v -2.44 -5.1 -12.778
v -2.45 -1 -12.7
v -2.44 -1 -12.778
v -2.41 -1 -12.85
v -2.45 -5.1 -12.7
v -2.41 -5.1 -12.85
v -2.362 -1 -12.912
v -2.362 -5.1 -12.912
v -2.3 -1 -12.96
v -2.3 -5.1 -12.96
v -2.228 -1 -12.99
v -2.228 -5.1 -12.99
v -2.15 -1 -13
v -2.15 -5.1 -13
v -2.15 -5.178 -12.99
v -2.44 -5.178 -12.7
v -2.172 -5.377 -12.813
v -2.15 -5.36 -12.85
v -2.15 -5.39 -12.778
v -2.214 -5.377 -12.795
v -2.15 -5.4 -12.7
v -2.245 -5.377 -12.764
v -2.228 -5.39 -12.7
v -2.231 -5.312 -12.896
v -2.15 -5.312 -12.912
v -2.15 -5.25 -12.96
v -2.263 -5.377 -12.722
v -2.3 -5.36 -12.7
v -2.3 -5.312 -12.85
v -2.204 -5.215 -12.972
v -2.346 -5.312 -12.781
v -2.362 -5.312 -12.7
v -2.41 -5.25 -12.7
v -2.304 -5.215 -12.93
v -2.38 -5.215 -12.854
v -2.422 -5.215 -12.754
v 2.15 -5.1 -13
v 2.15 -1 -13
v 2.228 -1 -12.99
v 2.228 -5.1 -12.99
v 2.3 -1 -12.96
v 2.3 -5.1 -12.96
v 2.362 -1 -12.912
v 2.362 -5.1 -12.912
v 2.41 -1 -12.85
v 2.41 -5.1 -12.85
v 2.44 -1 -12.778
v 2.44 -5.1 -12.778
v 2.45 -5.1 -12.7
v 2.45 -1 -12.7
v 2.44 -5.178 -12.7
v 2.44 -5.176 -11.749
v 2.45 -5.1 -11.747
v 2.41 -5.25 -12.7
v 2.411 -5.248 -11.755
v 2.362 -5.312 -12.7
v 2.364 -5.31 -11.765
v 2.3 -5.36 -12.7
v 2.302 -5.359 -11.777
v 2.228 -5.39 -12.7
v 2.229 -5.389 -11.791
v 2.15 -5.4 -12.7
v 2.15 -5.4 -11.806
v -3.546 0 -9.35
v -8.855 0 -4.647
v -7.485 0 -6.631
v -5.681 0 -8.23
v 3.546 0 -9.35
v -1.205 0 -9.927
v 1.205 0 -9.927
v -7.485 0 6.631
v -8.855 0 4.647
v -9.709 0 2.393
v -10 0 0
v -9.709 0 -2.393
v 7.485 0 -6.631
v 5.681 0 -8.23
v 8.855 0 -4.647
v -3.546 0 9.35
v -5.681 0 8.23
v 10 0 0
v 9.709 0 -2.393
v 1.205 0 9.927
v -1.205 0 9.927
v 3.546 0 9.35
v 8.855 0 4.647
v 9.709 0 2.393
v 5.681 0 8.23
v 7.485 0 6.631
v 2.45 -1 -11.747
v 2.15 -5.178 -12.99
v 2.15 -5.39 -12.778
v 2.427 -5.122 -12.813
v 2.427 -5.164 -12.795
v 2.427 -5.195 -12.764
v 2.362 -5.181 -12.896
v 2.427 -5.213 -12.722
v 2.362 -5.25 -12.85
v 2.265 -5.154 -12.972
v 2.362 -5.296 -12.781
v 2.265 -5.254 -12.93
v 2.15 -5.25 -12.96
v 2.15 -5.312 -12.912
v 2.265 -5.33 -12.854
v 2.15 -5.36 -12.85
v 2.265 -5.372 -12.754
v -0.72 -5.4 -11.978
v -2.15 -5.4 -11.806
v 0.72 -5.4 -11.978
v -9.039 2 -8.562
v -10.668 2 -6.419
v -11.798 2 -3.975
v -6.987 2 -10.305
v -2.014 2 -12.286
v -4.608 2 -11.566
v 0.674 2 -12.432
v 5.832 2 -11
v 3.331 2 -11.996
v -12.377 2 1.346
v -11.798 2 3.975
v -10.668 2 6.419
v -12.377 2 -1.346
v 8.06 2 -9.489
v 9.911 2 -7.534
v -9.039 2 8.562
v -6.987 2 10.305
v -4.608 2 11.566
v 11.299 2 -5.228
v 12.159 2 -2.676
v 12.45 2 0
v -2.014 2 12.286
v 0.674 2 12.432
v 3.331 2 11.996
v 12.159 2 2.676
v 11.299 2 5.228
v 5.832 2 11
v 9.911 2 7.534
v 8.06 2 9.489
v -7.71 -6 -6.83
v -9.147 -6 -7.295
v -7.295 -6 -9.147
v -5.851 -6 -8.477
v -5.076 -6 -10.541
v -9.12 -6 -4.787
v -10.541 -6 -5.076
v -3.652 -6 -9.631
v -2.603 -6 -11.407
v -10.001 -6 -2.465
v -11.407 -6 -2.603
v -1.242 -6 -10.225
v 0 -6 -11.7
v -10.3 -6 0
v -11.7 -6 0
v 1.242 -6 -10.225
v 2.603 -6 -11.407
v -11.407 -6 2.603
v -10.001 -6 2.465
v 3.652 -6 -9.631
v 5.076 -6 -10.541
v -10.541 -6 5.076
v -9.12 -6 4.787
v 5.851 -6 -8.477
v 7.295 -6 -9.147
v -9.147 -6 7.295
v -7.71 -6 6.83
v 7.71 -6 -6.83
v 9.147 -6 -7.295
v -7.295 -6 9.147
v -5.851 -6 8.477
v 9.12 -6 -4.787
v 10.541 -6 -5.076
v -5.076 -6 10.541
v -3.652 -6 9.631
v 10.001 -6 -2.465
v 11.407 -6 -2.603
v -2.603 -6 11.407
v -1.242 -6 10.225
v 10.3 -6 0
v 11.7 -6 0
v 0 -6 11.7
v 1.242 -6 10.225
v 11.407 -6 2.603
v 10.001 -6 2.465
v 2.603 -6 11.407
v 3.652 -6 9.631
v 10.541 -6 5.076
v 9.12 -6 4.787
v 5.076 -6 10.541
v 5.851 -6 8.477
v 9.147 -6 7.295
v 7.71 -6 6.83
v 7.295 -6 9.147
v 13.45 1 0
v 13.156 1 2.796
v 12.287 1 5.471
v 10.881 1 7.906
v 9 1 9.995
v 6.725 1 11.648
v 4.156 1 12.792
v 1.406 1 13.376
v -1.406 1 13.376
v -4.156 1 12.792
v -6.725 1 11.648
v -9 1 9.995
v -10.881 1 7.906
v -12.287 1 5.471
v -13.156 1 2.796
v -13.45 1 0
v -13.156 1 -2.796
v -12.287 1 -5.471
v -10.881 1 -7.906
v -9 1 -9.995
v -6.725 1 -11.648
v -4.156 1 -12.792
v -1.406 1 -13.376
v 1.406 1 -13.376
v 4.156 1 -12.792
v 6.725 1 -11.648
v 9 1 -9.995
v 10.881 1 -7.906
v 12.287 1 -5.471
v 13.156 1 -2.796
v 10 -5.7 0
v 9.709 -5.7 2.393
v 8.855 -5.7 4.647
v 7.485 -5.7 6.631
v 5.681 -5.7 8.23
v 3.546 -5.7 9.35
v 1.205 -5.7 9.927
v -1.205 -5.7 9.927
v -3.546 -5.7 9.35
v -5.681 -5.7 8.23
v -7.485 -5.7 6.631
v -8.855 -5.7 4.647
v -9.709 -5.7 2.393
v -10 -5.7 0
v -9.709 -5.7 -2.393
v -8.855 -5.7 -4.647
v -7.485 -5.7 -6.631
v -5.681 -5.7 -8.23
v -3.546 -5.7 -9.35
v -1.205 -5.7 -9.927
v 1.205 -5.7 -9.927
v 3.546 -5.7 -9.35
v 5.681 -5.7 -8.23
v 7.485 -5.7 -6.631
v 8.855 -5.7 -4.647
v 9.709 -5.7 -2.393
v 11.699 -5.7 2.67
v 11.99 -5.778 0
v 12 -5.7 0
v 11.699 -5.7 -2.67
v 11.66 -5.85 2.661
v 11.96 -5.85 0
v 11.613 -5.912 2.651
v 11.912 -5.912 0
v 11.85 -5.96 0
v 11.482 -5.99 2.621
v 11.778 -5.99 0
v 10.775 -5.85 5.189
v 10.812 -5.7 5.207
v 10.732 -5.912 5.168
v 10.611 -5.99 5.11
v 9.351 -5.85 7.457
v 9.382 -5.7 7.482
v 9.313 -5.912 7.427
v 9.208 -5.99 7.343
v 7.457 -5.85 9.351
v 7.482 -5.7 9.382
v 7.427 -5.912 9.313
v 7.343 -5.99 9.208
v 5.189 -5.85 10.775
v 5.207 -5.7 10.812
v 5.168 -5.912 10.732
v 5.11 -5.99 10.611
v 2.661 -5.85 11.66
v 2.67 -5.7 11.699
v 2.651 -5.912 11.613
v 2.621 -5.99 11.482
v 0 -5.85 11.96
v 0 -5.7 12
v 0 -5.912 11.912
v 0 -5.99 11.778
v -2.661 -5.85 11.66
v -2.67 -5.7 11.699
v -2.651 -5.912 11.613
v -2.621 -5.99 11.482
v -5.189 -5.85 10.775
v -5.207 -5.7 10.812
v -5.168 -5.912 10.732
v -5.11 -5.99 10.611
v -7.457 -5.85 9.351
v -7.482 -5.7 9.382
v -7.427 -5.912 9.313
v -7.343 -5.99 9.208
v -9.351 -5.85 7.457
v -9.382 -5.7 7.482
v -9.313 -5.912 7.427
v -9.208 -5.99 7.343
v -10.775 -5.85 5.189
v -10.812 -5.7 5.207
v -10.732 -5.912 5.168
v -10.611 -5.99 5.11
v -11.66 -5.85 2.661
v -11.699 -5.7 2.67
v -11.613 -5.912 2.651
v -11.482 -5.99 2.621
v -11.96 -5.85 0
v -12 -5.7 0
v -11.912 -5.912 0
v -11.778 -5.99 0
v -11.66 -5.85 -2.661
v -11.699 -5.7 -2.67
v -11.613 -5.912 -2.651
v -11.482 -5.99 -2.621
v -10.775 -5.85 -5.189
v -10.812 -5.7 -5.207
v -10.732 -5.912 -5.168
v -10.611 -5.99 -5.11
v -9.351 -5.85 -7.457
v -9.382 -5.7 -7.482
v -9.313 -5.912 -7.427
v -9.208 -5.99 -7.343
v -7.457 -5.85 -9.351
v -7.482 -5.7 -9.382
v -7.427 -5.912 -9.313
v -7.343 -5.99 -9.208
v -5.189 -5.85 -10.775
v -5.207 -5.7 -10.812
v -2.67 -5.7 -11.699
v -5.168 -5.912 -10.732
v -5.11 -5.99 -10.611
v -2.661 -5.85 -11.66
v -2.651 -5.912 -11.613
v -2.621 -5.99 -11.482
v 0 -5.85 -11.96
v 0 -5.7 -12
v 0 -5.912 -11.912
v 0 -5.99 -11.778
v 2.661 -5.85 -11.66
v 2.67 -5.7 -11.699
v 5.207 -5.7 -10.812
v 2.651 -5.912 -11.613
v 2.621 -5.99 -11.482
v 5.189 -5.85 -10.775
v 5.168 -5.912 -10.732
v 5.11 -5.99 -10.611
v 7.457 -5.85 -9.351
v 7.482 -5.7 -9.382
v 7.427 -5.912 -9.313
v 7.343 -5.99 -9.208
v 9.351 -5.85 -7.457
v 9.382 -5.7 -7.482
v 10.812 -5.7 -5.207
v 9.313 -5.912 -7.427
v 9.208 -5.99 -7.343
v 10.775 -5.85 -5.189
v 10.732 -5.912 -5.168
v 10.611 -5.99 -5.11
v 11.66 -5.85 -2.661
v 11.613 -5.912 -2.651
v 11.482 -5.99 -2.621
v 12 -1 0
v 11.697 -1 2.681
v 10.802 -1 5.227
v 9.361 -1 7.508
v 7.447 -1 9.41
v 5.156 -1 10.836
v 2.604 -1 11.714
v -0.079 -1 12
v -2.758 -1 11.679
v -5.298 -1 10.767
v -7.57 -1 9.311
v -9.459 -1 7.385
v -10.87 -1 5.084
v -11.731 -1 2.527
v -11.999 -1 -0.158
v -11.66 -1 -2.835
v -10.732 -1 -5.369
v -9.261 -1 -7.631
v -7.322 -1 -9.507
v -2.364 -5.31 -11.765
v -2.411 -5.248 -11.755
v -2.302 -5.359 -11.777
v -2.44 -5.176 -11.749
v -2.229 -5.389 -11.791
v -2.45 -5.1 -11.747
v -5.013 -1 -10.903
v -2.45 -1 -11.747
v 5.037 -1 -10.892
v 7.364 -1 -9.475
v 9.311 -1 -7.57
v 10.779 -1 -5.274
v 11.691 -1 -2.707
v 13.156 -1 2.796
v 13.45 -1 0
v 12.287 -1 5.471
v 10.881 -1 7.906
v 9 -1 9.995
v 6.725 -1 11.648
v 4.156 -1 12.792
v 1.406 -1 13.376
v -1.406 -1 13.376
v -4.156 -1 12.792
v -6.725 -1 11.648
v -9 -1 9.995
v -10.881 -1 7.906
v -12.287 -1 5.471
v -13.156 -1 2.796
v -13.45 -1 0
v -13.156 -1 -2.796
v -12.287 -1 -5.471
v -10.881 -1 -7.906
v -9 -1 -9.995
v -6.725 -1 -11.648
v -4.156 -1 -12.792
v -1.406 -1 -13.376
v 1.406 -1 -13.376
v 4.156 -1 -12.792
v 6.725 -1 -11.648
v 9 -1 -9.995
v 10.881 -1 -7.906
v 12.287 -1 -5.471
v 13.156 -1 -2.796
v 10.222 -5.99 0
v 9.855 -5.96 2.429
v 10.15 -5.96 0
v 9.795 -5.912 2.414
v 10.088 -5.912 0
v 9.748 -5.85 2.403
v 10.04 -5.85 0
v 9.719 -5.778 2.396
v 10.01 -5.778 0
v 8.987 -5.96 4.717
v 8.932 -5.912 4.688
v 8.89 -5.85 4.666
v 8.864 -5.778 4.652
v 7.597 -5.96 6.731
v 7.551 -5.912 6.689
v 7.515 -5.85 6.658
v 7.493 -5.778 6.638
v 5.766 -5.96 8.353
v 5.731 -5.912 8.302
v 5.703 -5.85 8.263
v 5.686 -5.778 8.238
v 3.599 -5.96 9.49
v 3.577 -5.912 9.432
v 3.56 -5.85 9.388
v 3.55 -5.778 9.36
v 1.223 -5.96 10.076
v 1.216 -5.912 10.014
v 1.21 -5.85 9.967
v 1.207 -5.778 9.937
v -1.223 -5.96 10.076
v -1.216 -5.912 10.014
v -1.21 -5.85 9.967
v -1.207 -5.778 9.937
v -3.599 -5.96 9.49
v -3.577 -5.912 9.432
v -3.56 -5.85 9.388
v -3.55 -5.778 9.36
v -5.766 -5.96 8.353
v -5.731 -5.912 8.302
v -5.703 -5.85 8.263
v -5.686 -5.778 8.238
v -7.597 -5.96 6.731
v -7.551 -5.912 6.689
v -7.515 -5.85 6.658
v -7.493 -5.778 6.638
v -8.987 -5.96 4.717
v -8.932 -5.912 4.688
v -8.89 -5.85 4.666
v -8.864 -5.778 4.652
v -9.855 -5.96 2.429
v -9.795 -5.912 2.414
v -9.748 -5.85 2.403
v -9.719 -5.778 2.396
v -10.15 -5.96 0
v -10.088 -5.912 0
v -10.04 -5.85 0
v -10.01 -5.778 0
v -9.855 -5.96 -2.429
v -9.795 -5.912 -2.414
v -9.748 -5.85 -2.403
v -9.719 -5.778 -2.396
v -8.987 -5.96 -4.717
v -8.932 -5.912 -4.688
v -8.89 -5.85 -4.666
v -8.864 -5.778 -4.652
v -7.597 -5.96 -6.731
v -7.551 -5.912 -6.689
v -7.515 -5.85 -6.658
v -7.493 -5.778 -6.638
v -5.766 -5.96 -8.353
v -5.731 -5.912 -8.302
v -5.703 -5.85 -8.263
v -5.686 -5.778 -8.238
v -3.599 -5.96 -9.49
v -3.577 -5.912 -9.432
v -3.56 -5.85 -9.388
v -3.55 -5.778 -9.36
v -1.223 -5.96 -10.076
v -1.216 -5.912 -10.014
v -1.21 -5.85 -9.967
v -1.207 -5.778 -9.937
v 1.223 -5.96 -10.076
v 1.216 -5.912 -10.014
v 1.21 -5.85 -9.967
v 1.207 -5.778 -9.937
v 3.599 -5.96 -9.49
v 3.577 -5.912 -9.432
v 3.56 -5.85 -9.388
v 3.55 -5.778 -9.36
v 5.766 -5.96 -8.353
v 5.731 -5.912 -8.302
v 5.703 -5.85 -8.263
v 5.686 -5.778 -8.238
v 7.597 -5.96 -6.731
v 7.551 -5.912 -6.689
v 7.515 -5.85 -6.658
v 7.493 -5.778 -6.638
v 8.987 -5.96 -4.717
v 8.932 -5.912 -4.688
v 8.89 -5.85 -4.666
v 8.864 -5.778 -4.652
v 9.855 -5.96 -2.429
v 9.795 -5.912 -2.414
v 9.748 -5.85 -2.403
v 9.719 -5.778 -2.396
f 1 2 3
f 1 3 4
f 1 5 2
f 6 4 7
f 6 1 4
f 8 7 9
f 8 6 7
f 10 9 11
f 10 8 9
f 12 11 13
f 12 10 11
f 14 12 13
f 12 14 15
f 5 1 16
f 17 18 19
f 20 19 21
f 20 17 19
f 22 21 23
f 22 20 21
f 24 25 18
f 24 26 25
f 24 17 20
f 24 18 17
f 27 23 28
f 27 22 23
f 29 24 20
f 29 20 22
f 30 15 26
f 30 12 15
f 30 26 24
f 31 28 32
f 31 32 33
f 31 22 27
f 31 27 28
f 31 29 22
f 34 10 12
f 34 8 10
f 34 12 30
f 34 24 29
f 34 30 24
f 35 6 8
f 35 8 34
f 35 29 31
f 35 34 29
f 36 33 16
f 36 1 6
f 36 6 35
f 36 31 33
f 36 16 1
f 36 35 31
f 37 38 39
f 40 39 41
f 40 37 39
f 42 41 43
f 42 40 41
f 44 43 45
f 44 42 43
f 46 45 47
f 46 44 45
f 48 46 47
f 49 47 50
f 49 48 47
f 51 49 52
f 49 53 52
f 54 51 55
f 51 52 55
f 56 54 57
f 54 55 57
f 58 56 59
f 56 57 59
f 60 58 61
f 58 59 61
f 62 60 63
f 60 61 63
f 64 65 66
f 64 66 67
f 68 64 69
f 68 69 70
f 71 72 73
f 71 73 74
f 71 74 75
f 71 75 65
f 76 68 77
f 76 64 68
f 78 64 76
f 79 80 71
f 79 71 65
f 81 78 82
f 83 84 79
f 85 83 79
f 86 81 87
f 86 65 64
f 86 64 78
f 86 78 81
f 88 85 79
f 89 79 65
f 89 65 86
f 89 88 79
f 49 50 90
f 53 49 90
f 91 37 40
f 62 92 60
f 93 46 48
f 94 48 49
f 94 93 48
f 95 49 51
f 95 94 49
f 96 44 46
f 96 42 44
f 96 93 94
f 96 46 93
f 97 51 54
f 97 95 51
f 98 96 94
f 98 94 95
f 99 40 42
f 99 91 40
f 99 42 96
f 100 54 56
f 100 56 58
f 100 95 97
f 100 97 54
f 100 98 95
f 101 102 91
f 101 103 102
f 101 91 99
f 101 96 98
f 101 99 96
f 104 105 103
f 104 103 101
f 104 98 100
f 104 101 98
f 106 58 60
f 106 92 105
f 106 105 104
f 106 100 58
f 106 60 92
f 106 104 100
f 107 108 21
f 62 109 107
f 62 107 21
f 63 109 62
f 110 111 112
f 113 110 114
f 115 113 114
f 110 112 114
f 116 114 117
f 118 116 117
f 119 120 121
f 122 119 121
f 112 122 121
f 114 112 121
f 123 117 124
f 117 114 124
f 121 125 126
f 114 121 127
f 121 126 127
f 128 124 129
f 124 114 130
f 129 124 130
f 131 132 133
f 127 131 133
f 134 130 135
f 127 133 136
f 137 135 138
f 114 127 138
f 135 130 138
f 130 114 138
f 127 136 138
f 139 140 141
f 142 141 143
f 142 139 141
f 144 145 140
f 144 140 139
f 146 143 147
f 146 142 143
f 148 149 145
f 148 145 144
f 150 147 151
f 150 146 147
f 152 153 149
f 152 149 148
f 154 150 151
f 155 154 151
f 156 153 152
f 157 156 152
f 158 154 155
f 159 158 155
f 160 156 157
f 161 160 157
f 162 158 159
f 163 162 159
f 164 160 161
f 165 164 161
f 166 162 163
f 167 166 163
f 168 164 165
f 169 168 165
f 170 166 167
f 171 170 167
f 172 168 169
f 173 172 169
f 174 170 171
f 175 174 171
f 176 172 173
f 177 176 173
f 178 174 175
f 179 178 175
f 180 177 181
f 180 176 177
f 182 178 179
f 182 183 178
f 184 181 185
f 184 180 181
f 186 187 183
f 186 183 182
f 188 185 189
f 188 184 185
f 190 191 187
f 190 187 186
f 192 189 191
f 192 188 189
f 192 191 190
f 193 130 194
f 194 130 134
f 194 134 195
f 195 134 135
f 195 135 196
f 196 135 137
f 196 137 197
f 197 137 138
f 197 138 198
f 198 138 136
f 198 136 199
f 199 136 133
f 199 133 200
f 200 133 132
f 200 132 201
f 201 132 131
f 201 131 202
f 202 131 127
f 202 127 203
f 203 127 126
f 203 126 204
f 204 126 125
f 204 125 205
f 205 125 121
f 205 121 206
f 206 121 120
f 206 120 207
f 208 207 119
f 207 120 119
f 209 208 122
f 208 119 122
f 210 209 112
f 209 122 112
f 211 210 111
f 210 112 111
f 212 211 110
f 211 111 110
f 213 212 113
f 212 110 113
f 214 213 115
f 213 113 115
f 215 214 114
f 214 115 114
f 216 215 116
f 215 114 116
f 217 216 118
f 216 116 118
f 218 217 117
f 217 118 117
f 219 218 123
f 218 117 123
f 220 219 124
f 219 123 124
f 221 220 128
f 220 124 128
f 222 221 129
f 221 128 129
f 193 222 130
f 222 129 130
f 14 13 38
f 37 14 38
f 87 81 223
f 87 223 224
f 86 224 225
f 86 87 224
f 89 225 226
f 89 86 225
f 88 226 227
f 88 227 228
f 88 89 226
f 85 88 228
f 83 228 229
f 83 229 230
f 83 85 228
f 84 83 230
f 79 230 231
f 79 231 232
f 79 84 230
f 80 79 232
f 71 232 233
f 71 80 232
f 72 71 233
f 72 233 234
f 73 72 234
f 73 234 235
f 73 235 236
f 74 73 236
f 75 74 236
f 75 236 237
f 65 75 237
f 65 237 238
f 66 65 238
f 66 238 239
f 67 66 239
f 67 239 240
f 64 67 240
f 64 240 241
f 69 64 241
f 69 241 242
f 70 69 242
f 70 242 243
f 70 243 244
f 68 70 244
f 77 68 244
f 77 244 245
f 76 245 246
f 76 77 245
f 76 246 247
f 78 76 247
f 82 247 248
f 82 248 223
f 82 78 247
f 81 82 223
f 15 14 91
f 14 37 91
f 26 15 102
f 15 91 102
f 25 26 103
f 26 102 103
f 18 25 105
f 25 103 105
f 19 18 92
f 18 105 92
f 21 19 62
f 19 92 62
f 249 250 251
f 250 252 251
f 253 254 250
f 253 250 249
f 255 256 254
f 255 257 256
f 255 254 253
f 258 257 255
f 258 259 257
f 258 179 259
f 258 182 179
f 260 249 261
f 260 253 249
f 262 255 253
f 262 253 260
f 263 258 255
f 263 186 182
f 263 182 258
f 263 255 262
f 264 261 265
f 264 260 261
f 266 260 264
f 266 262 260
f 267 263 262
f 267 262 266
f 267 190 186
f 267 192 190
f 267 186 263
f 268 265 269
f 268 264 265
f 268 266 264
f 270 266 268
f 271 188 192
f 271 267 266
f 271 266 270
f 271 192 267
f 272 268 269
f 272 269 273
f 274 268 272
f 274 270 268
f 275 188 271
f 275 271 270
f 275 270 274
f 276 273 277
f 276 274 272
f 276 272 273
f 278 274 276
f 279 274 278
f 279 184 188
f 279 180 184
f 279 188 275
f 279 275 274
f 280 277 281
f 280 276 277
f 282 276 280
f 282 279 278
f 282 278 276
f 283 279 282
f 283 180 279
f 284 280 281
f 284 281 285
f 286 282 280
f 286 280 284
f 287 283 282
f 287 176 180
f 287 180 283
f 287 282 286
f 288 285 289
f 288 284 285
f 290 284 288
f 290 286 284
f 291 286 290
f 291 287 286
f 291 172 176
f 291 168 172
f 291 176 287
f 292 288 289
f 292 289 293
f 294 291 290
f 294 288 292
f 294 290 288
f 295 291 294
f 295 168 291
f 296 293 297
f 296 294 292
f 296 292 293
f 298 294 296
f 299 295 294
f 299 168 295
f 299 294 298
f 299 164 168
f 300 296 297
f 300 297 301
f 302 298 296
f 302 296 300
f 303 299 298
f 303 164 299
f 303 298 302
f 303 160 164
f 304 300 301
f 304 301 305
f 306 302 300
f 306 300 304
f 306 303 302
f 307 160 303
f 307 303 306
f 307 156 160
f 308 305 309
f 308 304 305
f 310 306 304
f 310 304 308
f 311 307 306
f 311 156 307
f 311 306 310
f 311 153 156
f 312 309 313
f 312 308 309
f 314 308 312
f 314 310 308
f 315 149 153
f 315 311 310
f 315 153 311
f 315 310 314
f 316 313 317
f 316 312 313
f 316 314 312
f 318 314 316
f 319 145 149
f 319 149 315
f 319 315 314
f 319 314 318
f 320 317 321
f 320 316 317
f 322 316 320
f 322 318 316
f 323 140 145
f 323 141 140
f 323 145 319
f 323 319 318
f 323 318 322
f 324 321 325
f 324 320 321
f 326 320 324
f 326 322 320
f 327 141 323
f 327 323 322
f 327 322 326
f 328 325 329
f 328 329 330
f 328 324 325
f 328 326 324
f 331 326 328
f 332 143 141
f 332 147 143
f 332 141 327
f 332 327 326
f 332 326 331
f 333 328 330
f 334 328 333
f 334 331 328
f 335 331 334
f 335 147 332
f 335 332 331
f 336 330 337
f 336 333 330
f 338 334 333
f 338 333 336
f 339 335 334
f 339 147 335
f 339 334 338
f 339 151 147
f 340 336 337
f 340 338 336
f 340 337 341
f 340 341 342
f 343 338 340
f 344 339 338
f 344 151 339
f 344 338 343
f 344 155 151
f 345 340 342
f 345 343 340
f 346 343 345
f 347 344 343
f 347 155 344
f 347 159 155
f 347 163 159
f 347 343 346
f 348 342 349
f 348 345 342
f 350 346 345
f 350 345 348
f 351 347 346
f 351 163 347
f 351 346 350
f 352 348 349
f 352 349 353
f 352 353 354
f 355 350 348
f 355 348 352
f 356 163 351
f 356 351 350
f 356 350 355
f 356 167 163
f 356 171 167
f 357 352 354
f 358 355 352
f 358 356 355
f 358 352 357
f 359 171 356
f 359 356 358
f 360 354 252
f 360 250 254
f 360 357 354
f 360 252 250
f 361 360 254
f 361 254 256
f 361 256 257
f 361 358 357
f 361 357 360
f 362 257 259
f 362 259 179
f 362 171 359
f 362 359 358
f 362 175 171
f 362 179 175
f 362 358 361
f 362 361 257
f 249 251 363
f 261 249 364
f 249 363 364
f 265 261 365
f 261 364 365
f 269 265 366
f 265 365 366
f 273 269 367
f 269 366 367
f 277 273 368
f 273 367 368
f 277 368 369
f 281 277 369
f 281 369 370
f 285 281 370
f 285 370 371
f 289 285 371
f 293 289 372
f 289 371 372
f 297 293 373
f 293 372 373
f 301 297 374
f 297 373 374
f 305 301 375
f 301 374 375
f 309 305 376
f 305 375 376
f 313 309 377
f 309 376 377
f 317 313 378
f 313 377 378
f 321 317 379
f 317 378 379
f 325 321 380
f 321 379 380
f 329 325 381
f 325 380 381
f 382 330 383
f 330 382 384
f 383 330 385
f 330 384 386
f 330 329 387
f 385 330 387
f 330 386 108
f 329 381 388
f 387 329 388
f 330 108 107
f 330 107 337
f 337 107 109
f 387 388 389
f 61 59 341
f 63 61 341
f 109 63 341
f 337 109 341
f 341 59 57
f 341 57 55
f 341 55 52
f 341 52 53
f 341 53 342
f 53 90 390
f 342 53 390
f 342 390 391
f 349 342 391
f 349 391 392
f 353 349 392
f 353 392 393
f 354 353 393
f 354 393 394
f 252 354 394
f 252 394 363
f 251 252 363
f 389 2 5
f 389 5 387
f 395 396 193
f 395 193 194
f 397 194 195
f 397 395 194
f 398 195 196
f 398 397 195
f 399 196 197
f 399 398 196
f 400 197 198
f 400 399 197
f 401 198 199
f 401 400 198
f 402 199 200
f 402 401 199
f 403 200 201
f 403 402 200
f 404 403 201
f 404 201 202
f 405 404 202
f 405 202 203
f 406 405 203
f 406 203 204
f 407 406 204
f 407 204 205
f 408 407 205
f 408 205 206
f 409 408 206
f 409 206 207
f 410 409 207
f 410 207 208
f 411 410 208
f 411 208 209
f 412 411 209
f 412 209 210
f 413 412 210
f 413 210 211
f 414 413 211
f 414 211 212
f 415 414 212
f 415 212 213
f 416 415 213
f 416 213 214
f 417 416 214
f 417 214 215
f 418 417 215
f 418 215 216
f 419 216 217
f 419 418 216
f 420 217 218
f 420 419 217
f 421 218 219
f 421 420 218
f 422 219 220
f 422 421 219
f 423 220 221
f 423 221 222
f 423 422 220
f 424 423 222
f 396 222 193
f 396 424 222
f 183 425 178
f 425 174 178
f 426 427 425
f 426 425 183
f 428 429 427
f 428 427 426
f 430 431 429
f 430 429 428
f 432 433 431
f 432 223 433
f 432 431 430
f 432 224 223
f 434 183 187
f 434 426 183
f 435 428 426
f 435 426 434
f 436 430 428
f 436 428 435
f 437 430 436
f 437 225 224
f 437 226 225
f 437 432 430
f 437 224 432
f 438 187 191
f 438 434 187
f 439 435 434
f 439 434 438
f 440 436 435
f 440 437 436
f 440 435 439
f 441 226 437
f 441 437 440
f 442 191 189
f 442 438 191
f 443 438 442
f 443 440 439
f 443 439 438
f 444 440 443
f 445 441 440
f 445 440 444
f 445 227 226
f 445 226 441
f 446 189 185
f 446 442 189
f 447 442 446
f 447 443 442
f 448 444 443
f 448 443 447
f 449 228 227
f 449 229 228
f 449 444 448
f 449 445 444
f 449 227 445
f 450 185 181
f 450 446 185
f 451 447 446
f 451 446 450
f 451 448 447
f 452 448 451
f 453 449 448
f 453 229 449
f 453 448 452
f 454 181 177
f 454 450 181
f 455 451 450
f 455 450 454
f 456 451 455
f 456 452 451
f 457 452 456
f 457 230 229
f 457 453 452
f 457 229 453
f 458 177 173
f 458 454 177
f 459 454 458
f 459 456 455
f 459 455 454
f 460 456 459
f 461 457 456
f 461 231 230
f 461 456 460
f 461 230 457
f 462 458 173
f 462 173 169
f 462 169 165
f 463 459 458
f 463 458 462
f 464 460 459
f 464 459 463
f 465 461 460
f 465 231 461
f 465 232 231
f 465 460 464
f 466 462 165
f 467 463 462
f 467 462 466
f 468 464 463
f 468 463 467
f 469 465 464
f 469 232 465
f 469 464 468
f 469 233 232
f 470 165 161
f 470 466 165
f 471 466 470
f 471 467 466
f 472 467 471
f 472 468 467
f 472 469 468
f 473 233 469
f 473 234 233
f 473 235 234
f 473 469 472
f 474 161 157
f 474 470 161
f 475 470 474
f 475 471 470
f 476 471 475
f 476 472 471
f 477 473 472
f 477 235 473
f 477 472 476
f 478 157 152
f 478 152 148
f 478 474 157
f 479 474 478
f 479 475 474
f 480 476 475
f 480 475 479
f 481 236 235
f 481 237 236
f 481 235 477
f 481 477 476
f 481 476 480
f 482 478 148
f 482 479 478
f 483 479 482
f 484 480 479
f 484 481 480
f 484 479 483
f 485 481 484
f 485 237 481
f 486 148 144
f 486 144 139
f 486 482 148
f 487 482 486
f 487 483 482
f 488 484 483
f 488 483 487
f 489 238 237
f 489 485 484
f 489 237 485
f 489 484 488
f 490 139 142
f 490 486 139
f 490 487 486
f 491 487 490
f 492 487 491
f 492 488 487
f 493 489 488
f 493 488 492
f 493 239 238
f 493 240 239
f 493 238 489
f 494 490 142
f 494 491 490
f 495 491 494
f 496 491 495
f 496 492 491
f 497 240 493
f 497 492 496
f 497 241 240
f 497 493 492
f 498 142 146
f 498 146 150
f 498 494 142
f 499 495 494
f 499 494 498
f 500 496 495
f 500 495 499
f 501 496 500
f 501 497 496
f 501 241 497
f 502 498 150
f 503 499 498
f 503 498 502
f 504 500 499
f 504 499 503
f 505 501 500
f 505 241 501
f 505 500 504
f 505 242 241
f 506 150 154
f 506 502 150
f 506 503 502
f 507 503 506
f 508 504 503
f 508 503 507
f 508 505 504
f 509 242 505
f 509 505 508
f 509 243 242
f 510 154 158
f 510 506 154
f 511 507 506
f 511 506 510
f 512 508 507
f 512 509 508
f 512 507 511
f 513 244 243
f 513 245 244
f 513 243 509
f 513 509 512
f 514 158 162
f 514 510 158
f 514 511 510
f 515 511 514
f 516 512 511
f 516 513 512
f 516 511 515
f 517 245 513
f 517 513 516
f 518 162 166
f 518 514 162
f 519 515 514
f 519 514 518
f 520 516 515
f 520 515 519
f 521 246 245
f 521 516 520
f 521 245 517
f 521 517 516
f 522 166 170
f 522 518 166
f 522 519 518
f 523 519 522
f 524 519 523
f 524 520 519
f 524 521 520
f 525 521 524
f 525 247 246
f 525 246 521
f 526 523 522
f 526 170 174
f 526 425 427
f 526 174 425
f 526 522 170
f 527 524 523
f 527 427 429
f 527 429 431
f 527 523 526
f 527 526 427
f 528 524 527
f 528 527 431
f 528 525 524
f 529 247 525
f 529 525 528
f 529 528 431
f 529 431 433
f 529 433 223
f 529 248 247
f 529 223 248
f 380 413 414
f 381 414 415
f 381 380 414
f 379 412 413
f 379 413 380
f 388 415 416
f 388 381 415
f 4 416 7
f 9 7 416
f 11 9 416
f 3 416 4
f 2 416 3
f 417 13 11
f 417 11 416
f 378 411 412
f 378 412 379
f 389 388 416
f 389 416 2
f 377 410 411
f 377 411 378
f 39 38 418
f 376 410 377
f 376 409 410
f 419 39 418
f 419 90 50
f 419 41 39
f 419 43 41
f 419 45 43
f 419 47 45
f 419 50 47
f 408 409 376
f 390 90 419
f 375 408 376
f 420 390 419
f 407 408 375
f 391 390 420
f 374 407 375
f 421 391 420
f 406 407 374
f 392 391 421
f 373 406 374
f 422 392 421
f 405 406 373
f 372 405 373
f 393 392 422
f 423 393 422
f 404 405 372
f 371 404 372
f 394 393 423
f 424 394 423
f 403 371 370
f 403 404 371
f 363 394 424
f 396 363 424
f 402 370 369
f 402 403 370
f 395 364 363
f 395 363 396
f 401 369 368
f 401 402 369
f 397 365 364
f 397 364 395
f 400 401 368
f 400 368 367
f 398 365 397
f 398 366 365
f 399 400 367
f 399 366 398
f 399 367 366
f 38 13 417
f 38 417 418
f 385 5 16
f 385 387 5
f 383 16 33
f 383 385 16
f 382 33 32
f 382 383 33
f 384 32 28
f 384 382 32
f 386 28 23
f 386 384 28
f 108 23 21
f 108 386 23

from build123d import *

# Parameters (mm, degrees)
F0_R          = 12
F0_R_2        = 10
F1_DEPTH      = 6
F2_R          = 13.45
F3_DEPTH      = 1
F3_DEPTH_BACK = 2
F4_R          = 10
F5_DEPTH      = 6
F6_W          = 4.9
F6_H          = 2
F7_DEPTH      = 5.4
F8_SIZE       = 1
F9_R          = 0.3
F10_R         = 0.3


with BuildPart() as f1:
    # F0 (on Front) → F1 (new body)
    with BuildSketch(Plane.XZ):
        Circle(F0_R)
        Circle(F0_R_2, mode=Mode.SUBTRACT)
    extrude(amount=F1_DEPTH)

    # F2 (on Front) → F3 (join, two sides)
    with BuildSketch(Plane.XZ) as f3_sk:
        Circle(F2_R)
    extrude(amount=F3_DEPTH)
    extrude(f3_sk.sketch, amount=-F3_DEPTH_BACK)

    # F4 (on Front) → F5 (cut, through all)
    with BuildSketch(Plane.XZ):
        Circle(F4_R)
    extrude(amount=F5_DEPTH, mode=Mode.SUBTRACT)

    # F6 (on Front) → F7 (join)
    with BuildSketch(Plane.XZ):
        with Locations((0, -12)):
            Rectangle(F6_W, F6_H)
    extrude(amount=F7_DEPTH)

    # F8
    f8_edges = [f1.edges().sort_by_distance(p)[0] for p in [
        (-13.45, 2, 0),
    ]]
    chamfer(f8_edges, length=F8_SIZE)

    # F9
    f9_edges = [f1.edges().sort_by_distance(p)[0] for p in [
        (-2.45, -3.2, -13),
        (0, -5.4, -13),
        (2.45, -3.2, -13),
        (-2.45, -5.4, -12.373617),
        (2.45, -5.4, -12.373617),
    ]]
    fillet(f9_edges, radius=F9_R)

    # F10
    f10_edges = [f1.edges().sort_by_distance(p)[0] for p in [
        (-12, -6, 0),
        (-10, -6, 0),
    ]]
    fillet(f10_edges, radius=F10_R)


solid = f1.part
